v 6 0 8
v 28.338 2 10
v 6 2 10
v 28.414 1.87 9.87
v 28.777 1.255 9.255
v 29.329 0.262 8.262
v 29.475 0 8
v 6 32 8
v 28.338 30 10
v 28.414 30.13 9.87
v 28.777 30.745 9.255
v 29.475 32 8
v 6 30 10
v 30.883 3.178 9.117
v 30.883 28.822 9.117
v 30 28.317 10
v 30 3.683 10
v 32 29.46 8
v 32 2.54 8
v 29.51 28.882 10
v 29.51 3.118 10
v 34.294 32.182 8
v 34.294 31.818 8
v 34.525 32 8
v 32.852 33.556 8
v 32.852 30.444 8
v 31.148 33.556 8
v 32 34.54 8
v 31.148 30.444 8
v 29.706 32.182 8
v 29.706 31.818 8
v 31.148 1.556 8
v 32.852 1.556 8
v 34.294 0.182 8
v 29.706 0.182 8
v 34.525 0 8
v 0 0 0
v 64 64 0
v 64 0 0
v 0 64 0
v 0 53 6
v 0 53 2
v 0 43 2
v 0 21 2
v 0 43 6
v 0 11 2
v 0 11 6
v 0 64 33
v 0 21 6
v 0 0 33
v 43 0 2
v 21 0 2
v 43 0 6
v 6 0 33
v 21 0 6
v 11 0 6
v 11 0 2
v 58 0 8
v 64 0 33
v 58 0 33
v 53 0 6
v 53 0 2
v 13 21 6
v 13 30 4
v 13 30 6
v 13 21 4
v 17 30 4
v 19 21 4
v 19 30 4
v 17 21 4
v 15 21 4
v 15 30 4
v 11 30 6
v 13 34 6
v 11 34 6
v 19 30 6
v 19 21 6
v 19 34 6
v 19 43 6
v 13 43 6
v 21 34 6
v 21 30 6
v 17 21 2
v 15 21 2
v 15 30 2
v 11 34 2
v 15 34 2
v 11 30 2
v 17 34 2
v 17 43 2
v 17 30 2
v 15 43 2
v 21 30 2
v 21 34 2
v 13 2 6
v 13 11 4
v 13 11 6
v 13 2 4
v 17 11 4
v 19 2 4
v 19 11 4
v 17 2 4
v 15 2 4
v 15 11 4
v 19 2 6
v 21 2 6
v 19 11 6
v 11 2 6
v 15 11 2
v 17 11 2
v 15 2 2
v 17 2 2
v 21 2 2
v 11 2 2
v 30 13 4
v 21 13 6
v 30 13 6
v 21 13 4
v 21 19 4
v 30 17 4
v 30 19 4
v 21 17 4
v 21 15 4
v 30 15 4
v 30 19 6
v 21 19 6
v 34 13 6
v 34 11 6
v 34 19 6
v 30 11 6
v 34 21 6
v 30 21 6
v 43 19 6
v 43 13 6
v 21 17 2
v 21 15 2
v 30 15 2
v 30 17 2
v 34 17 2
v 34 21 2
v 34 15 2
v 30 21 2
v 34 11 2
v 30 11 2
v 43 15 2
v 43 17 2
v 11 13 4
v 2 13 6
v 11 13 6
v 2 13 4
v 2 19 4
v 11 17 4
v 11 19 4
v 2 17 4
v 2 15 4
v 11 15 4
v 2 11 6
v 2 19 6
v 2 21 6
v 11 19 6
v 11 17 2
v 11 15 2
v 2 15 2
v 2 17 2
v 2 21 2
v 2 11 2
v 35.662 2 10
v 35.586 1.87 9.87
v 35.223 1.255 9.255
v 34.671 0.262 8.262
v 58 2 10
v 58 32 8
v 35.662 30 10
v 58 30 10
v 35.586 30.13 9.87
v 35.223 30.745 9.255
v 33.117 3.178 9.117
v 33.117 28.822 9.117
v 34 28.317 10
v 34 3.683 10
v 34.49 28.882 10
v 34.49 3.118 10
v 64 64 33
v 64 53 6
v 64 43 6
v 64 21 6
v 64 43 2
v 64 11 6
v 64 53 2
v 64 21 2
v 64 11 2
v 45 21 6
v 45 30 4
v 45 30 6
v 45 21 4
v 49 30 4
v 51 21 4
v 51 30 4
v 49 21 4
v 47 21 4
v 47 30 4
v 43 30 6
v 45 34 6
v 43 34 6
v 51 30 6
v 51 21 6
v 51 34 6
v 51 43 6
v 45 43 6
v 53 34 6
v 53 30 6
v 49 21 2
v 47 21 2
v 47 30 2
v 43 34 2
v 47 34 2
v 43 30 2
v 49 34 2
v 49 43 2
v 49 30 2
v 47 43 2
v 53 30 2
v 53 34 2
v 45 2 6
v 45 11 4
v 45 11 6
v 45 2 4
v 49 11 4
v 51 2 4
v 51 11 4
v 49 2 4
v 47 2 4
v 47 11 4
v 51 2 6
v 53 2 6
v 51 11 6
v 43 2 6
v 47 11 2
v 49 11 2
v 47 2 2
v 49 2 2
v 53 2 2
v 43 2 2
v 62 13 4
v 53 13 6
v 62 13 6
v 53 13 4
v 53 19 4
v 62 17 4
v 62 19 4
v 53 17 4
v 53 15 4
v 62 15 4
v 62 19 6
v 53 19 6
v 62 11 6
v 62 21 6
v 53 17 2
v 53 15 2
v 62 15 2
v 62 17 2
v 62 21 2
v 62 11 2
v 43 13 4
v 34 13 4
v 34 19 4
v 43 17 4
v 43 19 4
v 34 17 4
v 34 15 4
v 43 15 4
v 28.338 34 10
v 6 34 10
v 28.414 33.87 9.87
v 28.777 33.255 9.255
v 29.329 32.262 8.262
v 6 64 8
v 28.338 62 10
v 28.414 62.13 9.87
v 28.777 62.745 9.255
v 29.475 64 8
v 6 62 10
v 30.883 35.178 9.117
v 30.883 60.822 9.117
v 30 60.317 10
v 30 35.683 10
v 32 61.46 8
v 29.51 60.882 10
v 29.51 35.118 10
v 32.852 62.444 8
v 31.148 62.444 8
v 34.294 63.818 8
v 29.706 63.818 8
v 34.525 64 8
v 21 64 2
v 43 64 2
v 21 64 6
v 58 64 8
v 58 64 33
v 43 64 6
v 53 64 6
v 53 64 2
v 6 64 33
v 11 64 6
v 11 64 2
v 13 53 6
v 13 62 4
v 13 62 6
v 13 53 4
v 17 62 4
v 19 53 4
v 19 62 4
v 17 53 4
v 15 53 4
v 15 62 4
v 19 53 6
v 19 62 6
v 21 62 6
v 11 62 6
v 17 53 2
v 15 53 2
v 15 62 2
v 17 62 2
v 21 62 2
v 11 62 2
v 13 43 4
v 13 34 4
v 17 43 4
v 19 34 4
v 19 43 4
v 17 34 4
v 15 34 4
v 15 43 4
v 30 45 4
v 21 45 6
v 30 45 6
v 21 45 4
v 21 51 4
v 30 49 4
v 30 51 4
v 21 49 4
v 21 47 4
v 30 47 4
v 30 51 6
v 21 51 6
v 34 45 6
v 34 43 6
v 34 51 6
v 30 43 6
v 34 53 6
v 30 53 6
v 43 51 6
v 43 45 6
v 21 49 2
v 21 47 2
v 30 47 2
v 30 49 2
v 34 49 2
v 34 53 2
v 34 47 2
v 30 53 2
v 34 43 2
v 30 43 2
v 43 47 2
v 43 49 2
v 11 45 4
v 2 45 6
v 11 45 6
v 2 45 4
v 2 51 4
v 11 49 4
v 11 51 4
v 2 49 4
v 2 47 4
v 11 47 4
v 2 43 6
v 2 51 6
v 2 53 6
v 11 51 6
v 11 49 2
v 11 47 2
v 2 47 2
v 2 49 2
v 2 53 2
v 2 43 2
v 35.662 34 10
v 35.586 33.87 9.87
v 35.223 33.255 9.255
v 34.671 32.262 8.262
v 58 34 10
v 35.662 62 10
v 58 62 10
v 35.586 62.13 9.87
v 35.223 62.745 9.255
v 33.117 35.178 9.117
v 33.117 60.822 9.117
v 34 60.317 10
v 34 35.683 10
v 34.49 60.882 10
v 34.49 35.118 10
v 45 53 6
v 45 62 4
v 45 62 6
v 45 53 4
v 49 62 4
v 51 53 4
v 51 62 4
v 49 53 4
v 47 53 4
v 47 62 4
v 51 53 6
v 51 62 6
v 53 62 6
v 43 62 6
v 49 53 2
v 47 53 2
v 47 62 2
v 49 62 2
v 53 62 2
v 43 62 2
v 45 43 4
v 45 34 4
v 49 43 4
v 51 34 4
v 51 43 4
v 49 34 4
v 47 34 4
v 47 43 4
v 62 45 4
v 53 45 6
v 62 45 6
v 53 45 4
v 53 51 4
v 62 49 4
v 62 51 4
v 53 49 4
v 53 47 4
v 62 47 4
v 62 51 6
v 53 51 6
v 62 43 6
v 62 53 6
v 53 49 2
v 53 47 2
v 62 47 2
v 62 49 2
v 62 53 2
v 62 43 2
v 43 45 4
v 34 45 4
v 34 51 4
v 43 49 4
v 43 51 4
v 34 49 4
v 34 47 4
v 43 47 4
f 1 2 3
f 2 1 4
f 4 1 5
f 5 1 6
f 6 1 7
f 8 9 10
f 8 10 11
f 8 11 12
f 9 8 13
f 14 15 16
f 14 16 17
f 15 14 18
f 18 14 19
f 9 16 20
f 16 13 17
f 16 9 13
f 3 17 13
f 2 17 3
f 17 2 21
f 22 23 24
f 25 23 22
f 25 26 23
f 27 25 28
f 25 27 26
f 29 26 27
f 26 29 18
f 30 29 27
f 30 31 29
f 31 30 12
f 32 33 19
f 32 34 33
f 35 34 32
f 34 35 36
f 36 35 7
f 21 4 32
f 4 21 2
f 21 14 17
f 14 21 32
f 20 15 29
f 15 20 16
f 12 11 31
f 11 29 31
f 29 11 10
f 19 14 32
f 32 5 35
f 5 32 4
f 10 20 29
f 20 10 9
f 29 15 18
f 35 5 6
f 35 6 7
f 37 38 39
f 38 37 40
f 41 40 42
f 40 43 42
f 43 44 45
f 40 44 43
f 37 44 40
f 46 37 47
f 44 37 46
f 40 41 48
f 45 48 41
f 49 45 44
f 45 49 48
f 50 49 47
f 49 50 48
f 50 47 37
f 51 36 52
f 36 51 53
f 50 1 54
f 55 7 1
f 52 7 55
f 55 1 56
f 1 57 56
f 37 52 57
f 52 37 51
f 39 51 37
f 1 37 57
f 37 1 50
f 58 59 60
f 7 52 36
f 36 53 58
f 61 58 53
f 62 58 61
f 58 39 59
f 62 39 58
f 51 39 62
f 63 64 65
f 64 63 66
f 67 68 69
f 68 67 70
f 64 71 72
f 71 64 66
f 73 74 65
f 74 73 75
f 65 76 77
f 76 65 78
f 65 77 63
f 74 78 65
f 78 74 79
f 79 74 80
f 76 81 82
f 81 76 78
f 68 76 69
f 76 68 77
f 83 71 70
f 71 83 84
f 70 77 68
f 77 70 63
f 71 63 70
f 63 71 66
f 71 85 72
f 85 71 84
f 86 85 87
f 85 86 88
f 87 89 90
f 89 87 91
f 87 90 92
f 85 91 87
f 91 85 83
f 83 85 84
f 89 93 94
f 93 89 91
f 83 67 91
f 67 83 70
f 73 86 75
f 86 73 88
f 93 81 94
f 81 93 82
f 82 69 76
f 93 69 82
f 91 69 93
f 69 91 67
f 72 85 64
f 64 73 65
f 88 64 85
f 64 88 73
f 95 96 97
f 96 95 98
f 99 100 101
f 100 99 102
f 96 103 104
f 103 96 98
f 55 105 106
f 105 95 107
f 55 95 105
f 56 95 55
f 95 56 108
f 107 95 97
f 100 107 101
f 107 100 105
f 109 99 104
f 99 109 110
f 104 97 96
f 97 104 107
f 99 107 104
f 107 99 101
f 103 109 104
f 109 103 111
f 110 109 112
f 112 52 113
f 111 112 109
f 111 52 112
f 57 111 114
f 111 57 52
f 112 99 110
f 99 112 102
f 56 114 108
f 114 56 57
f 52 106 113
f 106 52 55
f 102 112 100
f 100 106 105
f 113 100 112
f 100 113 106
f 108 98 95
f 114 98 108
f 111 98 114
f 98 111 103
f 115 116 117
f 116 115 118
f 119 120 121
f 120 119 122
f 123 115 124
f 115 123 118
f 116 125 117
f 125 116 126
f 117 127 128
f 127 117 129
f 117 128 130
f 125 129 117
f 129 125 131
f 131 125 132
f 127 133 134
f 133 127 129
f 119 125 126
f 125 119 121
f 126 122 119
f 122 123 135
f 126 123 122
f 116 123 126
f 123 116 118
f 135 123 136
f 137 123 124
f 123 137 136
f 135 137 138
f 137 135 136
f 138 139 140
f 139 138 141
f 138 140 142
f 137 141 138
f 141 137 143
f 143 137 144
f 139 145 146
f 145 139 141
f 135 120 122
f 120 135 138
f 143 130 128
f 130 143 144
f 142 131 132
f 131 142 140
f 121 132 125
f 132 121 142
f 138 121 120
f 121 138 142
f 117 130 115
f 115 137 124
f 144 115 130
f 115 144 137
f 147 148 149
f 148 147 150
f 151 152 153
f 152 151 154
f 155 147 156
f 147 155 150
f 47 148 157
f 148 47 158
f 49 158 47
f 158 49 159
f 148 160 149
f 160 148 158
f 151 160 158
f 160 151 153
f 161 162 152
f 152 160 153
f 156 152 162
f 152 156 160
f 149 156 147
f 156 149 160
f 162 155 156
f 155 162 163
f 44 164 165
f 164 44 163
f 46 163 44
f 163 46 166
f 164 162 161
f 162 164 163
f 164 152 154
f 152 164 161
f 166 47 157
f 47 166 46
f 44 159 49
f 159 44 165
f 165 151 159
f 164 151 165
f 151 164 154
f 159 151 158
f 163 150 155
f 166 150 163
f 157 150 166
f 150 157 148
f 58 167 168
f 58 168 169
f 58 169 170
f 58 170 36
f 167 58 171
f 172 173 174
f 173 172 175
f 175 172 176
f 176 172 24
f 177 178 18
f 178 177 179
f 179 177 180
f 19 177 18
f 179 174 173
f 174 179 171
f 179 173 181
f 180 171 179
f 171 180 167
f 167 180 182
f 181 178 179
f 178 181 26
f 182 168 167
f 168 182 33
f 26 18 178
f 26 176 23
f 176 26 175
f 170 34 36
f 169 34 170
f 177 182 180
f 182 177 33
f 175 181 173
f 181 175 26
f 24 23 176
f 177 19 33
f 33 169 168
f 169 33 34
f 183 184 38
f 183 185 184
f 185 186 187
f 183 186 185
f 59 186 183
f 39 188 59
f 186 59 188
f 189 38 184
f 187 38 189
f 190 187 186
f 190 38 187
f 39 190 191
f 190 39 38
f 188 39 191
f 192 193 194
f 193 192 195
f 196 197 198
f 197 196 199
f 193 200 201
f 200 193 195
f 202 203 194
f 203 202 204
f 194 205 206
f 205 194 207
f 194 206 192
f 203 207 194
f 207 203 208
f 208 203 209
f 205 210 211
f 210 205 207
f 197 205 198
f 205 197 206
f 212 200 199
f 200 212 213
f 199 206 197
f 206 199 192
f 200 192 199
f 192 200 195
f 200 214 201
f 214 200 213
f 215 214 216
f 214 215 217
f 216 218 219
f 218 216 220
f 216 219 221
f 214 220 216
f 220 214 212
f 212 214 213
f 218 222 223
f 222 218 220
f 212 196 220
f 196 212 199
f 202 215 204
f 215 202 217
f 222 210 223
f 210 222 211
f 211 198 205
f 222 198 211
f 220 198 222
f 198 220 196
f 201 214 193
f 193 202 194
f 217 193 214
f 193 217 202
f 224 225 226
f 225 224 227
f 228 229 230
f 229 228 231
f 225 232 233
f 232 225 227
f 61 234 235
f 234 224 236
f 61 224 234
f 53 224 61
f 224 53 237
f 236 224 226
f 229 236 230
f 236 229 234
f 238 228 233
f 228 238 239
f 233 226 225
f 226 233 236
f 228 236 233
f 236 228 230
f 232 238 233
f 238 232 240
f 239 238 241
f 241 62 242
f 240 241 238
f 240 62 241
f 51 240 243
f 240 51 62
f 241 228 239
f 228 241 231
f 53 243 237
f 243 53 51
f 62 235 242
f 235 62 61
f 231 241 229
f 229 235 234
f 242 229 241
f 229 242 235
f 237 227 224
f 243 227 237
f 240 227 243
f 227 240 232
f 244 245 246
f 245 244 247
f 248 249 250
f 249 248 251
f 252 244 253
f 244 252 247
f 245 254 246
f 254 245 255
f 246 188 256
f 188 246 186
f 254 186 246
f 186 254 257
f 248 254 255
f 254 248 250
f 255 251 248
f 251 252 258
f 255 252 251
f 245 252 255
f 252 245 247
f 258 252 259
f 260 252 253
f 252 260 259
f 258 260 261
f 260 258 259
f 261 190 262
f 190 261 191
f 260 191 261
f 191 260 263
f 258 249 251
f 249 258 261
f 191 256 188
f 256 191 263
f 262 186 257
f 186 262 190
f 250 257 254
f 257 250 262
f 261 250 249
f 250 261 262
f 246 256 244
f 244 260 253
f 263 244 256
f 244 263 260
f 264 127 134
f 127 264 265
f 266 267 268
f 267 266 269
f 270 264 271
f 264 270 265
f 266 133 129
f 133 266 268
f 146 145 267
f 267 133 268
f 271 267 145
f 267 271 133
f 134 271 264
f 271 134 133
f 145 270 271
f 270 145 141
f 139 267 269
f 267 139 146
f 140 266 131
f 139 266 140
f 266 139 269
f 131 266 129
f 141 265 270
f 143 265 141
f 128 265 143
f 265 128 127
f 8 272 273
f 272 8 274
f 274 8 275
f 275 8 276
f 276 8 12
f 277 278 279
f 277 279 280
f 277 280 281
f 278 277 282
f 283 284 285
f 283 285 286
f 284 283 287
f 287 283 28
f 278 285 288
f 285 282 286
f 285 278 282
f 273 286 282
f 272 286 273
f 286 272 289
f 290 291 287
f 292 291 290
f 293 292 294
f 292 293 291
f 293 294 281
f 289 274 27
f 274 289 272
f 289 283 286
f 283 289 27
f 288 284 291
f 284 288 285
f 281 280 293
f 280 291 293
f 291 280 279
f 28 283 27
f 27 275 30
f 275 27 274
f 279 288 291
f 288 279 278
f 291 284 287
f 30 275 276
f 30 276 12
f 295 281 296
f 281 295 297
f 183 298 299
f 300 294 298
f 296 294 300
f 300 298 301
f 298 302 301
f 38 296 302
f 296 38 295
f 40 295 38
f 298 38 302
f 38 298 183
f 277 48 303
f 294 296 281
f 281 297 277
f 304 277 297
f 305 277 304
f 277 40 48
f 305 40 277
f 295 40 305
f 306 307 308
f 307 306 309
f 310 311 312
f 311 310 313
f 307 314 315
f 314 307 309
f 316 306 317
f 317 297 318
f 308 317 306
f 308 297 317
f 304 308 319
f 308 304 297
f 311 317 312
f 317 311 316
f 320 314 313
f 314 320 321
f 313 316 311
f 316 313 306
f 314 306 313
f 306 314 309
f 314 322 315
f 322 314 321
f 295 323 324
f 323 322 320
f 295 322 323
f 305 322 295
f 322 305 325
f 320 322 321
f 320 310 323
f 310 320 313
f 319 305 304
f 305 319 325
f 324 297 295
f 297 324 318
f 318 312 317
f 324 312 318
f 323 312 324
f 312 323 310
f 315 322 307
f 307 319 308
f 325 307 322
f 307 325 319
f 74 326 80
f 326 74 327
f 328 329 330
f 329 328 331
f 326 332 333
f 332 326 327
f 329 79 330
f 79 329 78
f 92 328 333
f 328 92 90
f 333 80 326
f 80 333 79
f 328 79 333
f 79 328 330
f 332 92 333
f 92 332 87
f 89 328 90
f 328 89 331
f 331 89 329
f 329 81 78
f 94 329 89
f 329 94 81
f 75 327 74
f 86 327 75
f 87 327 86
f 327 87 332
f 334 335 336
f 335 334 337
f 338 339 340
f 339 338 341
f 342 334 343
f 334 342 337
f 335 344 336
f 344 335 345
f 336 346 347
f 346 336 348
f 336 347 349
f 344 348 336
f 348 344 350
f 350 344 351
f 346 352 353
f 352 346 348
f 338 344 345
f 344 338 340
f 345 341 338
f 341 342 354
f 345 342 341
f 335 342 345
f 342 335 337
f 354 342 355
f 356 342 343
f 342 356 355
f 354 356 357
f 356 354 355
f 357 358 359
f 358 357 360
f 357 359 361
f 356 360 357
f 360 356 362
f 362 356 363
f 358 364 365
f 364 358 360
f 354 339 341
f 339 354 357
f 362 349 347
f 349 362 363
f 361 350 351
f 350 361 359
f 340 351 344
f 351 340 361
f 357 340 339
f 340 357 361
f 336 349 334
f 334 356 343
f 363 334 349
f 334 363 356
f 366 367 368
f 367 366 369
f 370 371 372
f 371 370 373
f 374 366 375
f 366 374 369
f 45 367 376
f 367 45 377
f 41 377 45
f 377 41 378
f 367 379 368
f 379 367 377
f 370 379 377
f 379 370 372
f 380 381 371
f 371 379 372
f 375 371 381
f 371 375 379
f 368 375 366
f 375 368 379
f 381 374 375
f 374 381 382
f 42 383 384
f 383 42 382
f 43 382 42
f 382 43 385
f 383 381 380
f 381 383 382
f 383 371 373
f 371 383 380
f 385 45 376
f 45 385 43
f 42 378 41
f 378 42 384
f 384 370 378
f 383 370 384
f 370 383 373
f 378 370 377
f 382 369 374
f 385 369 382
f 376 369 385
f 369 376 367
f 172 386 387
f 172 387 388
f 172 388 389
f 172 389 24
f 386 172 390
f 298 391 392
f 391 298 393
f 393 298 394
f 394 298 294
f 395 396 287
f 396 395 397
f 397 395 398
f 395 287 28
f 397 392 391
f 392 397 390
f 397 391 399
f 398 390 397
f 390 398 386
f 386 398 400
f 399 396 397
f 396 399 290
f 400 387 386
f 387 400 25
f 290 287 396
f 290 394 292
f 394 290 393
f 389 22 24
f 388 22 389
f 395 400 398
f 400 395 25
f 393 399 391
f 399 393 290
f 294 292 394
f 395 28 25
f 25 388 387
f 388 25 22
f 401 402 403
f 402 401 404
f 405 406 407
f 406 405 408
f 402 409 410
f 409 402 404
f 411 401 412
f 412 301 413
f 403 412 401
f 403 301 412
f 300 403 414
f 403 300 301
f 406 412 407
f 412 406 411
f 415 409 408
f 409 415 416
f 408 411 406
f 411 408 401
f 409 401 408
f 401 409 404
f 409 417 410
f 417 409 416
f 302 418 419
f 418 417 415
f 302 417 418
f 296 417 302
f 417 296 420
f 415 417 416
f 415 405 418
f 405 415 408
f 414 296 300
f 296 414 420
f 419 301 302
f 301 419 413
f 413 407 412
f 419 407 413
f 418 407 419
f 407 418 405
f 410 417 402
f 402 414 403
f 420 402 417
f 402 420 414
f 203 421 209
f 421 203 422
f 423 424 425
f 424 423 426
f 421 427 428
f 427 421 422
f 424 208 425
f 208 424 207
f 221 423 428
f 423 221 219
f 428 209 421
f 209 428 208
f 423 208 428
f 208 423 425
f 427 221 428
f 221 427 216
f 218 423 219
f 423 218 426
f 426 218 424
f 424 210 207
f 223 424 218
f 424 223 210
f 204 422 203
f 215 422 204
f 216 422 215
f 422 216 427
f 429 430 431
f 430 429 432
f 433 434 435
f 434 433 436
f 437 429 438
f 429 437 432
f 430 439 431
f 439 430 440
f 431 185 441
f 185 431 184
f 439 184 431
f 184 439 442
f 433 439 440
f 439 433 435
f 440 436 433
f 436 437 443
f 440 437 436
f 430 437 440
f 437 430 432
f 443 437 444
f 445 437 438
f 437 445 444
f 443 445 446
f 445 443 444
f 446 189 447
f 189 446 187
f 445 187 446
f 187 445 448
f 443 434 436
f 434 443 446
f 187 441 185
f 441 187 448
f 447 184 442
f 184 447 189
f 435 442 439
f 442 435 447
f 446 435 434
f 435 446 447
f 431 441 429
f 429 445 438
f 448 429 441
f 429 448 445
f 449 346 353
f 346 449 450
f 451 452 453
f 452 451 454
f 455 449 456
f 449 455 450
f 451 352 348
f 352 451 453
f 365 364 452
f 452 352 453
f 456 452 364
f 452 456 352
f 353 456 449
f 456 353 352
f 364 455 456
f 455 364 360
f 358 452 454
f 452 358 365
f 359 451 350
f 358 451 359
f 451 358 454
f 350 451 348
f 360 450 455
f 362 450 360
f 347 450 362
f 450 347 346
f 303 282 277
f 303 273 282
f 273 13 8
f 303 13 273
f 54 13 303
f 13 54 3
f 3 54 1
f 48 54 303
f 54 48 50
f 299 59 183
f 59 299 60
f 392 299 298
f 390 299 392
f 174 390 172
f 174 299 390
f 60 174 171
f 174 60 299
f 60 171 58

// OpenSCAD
// file: ModularDungeonTileLibrary.scad
//Constants
wallleft = 0;
wallbottom = 1;
wallright = 2;
walltop = 3;
wallcenter = 4;
walldoubleright = 5;


//Variables
size = 32;
connectorlength = size-10;
connectorwidth = 6;
connectorheight = 4;
baseheight = 8;
topperheight = 2;
topperrounded = true;
walllength = size;
wallheight = 25;
wallwidth = 6;
wallwidththin = 4;


//Functions
function hypotenuse_ra(side_a, side_b) =
    sqrt(pow(side_a, 2) + pow(side_b, 2));
    
    
//Modules    
module mtdl_Base_Connector(cw,cl,ch) {
    translate([-connectorwidth/2,-connectorlength/2,-connectorheight/2]) {
        cube([cw,cl,ch/2]);
        translate([cw/3,0,ch/2])
            cube([cw/3,cl,ch/2]);
        translate([-(cw-2)/2,cl/2-2,0])
            cube([cw+4,4,ch]);
    }
}

module mdtl_Base(s,bh)
{
    cube([s,s,bh]);
}

module mdtl_Topper(s,bh,th,tr)
{
    if (tr) {
        translate([0,0,bh])
            intersection() {
                difference () {
                        cube([s,s,th]);
                        union () {
                        rotate(a=45, v=[1,0,0])
                            cube([s,th*2,th*2]);
                        translate([0,s,0])
                            rotate(a=45, v=[1,0,0])
                                cube([s,th*2,th*2]);
                        rotate(a=-45, v=[0,1,0])
                            cube([th*2,s,th*2]);
                        translate([s,0,0])
                            rotate(a=-45, v=[0,1,0])
                                cube([th*2,s,th*2]);
                        }
                }
                translate([s/2,s/2,0])
                    cylinder(
                        h=th, 
                        r1=hypotenuse_ra(s/2-1.2, s/2-1.2), 
                        r2=hypotenuse_ra(s/2-th-.8, s/2-th-.8), 
                        center=false, 
                        $fa=.1);
            }    
    }
    else {
        translate([0,0,bh])
            difference() {
                cube([s,s,th]);
                union () {
                rotate(a=45, v=[1,0,0])
                    cube([s,th*2,th*2]);
                translate([0,s,0])
                    rotate(a=45, v=[1,0,0])
                        cube([s,th*2,th*2]);
                rotate(a=-45, v=[0,1,0])
                    cube([th*2,s,th*2]);
                translate([s,0,0])
                    rotate(a=-45, v=[0,1,0])
                        cube([th*2,s,th*2]);
                }
            }    
    }
}

module mdtl_Base_1x1(s,bh,th,tr) 
{
    difference () {
        union () {
            mdtl_Base(s,bh);
            mdtl_Topper(s,bh,th,tr);
        }
        union () {
            translate([size/2,size,baseheight/2])
                rotate([0,180,0])
                    mtdl_Base_Connector(connectorwidth,connectorlength,connectorheight);
            translate([size/2,0,baseheight/2])
                rotate([0,180,0])
                    mtdl_Base_Connector(connectorwidth,connectorlength,connectorheight);
            translate([size,size/2,baseheight/2])
                rotate([0,180,90])
                    mtdl_Base_Connector(connectorwidth,connectorlength,connectorheight);
            translate([0,size/2,baseheight/2])
                rotate([0,180,90])
                    mtdl_Base_Connector(connectorwidth,connectorlength,connectorheight);
        }
    }
}

module mdtl_Base_1x2(s,bh,th,tr)
{
    union () {
        mdtl_Base_1x1(s,bh,th,tr);
        translate([s,0,0])
            mdtl_Base_1x1(s,bh,th,tr);
    }
}
 
module mdtl_Base_2x2(s,bh,th,tr)
{
    union () {
        mdtl_Base_1x2(s,bh,th,tr);
        translate([0,s,0])
            mdtl_Base_1x2(s,bh,th,tr);
    }
}
 
module mdtl_Base_2x4(s,bh,th,tr)
{
    union () {
        mdtl_Base_2x2(s,bh,th,tr);
        translate([s*2,0,0])
            mdtl_Base_2x2(s,bh,th,tr);
    }
}
 
module mdtl_Base_4x4(s,bh,th,tr)
{
    union () {
        mdtl_Base_2x4(s,bh,th,tr);
        translate([0,s*2,0])
            mdtl_Base_2x4(s,bh,th,tr);
    }
}
 
module mdtl_Wall_1(w,l,h)
{
    translate([0,0,baseheight])
        cube([w,l,h]);   
}

module mdtl_Wall_1_Position(w,l,h,p)
{
    if (p==0) {
        mdtl_Wall_1(w,l,h);
    }
    
    else if (p==1) {
        rotate(a=-90)
           translate([-w,0,0])
               mdtl_Wall_1(w,l,h);       
    }
    
    else if (p==2) {
        translate([(size)-w,0,0])
            mdtl_Wall_1(w,l,h);
    }
    
    else if (p==3) {
        rotate(a=-90)
            translate([-l,0,0])
                mdtl_Wall_1(w,l,h);
    }
    
    else if (p==4) {
        translate([(size)-w/2,0,0])
            mdtl_Wall_1(w,l,h);
    }
    
    else if (p==5) {
        translate([(size*2)-w,0,0])
           mdtl_Wall_1(w,l,h);       
    }
}

module mdtl_Wall_2(w,l,h)
{
    union() {
        mdtl_Wall_1(w,l,h);
        translate([0,l,0])
            mdtl_Wall_1(w,l,h);
    }
}

module mdtl_Wall_2_Position(w,l,h,p)
{
    if (p==0) {
        mdtl_Wall_2(w,l,h);
    }
    
    else if (p==1) {
        rotate(a=-90)
            translate([-w,0,0])
                mdtl_Wall_2(w,l,h);
    }
    
    else if (p==2) {
    translate([(size*2)-w,0,0])
        mdtl_Wall_2(w,l,h);
    }
    
    else if (p==3) {
        rotate(a=-90)
            translate([-l*2,0,0])
                mdtl_Wall_2(w,l,h);
    }
    
    else if (p==4) {
        translate([(size)-w/2,0,0])
            mdtl_Wall_2(w,l,h);
    }
}
// main file
include <ModularDungeonTileLibrary.scad>; 
 
mdtl_Base_2x2(size,baseheight,topperheight,topperrounded);
mdtl_Wall_2_Position(wallwidth,walllength,wallheight,wallleft);
mdtl_Wall_2_Position(wallwidth,walllength,wallheight,wallright);
